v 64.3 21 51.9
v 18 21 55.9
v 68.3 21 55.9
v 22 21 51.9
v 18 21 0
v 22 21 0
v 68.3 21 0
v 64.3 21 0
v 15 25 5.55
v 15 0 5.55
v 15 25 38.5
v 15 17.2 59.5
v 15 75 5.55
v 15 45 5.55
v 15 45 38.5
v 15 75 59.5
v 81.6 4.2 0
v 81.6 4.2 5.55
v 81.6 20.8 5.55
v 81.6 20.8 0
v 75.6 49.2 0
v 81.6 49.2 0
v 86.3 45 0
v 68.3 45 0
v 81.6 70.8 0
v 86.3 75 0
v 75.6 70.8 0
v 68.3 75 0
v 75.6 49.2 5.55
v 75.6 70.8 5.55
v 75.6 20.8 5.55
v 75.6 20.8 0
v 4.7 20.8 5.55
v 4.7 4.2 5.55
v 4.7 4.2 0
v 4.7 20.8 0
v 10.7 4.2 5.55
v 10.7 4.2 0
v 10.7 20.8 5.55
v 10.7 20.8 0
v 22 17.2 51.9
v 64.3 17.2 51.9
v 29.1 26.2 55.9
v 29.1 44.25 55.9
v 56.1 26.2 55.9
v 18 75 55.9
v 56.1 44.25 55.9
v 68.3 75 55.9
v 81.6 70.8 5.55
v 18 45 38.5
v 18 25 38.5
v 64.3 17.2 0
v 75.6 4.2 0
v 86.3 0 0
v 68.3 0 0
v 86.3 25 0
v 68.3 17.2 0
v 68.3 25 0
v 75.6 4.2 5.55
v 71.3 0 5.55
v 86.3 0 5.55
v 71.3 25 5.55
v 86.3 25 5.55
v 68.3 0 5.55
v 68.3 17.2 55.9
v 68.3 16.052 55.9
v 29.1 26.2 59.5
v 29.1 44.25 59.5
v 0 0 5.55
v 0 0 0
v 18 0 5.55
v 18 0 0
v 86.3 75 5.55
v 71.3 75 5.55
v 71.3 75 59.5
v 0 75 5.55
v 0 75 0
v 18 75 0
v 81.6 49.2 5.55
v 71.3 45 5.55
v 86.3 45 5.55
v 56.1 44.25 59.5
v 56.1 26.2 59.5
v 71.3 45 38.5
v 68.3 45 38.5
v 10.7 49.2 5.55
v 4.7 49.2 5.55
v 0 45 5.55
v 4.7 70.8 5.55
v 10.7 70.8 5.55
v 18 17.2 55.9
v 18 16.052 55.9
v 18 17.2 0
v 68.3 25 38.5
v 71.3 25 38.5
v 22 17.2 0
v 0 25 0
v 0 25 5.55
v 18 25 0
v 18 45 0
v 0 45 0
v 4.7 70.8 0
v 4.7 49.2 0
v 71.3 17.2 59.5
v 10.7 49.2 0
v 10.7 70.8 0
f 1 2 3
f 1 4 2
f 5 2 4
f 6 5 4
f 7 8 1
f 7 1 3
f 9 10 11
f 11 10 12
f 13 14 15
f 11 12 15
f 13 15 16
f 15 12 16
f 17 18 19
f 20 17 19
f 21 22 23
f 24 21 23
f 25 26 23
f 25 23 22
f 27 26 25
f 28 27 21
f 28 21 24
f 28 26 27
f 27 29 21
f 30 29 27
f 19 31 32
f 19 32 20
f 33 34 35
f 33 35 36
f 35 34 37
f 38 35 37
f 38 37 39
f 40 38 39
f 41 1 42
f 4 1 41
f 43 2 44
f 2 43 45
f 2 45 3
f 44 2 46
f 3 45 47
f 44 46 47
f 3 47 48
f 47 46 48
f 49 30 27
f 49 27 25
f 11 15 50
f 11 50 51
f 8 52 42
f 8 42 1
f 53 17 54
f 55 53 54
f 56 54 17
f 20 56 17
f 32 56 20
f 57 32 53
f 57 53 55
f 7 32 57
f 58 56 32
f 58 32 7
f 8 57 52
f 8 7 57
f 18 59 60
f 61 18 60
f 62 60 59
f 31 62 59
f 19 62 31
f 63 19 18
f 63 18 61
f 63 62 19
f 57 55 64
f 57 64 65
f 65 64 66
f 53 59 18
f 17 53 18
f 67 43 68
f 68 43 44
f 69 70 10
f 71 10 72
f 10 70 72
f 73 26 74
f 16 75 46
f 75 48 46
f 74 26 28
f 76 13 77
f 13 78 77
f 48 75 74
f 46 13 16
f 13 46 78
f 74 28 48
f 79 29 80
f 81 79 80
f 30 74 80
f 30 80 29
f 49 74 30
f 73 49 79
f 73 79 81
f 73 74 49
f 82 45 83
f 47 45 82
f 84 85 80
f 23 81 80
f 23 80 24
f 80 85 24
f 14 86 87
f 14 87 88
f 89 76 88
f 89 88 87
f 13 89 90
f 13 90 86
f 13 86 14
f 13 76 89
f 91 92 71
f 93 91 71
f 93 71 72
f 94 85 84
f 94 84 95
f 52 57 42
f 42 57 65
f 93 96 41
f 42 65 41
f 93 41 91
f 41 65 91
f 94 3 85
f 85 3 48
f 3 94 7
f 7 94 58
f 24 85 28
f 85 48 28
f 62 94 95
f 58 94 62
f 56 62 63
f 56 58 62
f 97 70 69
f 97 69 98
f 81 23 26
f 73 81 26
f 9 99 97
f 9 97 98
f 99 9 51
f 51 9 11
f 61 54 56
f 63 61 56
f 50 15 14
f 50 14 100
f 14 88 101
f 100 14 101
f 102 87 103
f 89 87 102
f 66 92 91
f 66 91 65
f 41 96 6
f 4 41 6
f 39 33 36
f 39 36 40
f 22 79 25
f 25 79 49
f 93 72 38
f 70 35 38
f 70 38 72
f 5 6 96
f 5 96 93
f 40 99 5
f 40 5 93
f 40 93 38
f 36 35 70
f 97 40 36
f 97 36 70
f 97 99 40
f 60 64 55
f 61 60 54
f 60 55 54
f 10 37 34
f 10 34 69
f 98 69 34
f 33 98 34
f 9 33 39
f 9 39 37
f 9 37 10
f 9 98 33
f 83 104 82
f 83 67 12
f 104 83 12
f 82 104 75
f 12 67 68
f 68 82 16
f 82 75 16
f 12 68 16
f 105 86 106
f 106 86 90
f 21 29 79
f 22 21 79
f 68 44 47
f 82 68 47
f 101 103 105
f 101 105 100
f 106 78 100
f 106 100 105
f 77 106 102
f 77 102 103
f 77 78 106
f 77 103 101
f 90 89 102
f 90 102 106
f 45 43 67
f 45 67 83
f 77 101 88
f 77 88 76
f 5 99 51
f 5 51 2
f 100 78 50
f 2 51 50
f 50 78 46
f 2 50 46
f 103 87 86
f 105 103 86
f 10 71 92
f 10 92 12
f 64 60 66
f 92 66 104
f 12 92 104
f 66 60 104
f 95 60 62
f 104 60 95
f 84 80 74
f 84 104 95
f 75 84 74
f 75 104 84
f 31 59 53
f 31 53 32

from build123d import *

# Parameters (mm, degrees)
SKETCH1_W               = 27
SKETCH1_H               = 18.05
SKETCH1_W_2             = 15
SKETCH1_H_2             = 30
SKETCH1_H_3             = 25
BOSS_EXTRUDE1_DEPTH     = 59.5
SKETCH3_W               = 15
SKETCH3_H               = 75
CUT_EXTRUDE2_DEPTH      = 53.95
SKETCH4_W               = 6
SKETCH4_H               = 16.6
SKETCH4_H_2             = 21.6
CUT_EXTRUDE3_DEPTH      = 10
CUT_EXTRUDE4_DEPTH      = 1
CUT_EXTRUDE4_DEPTH_BACK = 54
CUT_EXTRUDE5_DEPTH      = 1
CUT_EXTRUDE5_DEPTH_BACK = 17.2
SKETCH8_W               = 42.3
SKETCH8_H               = 3.8
CUT_EXTRUDE6_DEPTH      = 51.9
CUT_EXTRUDE7_DEPTH      = 16
CUT_EXTRUDE7_DEPTH_BACK = 60
CUT_EXTRUDE8_DEPTH      = 60


with BuildPart() as part:
    # Sketch1 → Boss-Extrude1 (new body)
    with BuildSketch(Plane.XY):
        Polygon((71.3, 0), (15, 0), (15, 25), (15, 75), (71.3, 75), align=None)
        with Locations((42.6, 35.225)):
            Rectangle(SKETCH1_W, SKETCH1_H, mode=Mode.SUBTRACT)
        with Locations((78.8, 60)):
            Rectangle(SKETCH1_W_2, SKETCH1_H_2)
        with Locations((78.8, 12.5)):
            Rectangle(SKETCH1_W_2, SKETCH1_H_3)
        with Locations((7.5, 12.5)):
            Rectangle(SKETCH1_W_2, SKETCH1_H_3)
        with Locations((7.5, 60)):
            Rectangle(SKETCH1_W_2, SKETCH1_H_2)
    extrude(amount=BOSS_EXTRUDE1_DEPTH)

    # Sketch3 → Cut-Extrude2 (cut)
    with BuildSketch(Plane.XY.offset(59.5)):
        with Locations((7.5, 37.5)):
            Rectangle(SKETCH3_W, SKETCH3_H)
        with Locations((78.8, 37.5)):
            Rectangle(SKETCH3_W, SKETCH3_H)
    extrude(amount=-CUT_EXTRUDE2_DEPTH, mode=Mode.SUBTRACT)

    # Sketch4 → Cut-Extrude3 (cut)
    with BuildSketch(Plane.XY.offset(5.55)):
        with Locations((7.7, 12.5)):
            Rectangle(SKETCH4_W, SKETCH4_H)
        with Locations((7.7, 60)):
            Rectangle(SKETCH4_W, SKETCH4_H_2)
        with Locations((78.6, 60)):
            Rectangle(SKETCH4_W, SKETCH4_H_2)
        with Locations((78.6, 12.5)):
            Rectangle(SKETCH4_W, SKETCH4_H)
    extrude(amount=-CUT_EXTRUDE3_DEPTH, mode=Mode.SUBTRACT)

    # Sketch6 → Cut-Extrude4 (cut, two sides)
    with BuildSketch(Plane(origin=(0, 75, 0), x_dir=(1, 0, 0), z_dir=(0, 1, 0))) as cut_extrude4_sk:
        Polygon((18, 191.164455675), (18, 0), (18, -55.9), (68.3, -55.9), (68.3, 0), (68.3, 191.164455675), (68.3, 573.493367025), (18, 573.493367025), align=None)
    extrude(amount=CUT_EXTRUDE4_DEPTH, mode=Mode.SUBTRACT)
    extrude(cut_extrude4_sk.sketch, amount=-CUT_EXTRUDE4_DEPTH_BACK, mode=Mode.SUBTRACT)

    # Sketch7 → Cut-Extrude5 (cut, two sides)
    with BuildSketch(Plane.XZ) as cut_extrude5_sk:
        Polygon((18, -191.164455675), (18, 0), (18, 55.9), (68.3, 55.9), (68.3, 0), (68.3, -191.164455675), (68.3, -573.493367025), (18, -573.493367025), align=None)
    extrude(amount=CUT_EXTRUDE5_DEPTH, mode=Mode.SUBTRACT)
    extrude(cut_extrude5_sk.sketch, amount=-CUT_EXTRUDE5_DEPTH_BACK, mode=Mode.SUBTRACT)

    # Sketch8 → Cut-Extrude6 (cut)
    with BuildSketch(Plane(origin=(0, 0, 0), x_dir=(-1, 0, 0), z_dir=(0, 0, -1))):
        with Locations((-43.15, 19.1)):
            Rectangle(SKETCH8_W, SKETCH8_H)
    extrude(amount=-CUT_EXTRUDE6_DEPTH, mode=Mode.SUBTRACT)

    # Sketch9 → Cut-Extrude7 (cut, two sides)
    with BuildSketch(Plane.ZY.offset(-15)) as cut_extrude7_sk:
        Polygon((-165.43809057, 45), (0, 45), (38.5, 45), (38.5, 25), (0, 25), (-165.43809057, 25), (-496.31427171, 25), (-496.31427171, 45), align=None)
    extrude(amount=CUT_EXTRUDE7_DEPTH, mode=Mode.SUBTRACT)
    extrude(cut_extrude7_sk.sketch, amount=-CUT_EXTRUDE7_DEPTH_BACK, mode=Mode.SUBTRACT)

    # Sketch11 → Cut-Extrude8 (cut)
    with BuildSketch(Plane(origin=(71.3, 0, 0), x_dir=(0, 0, -1), z_dir=(1, 0, 0))):
        Polygon((-5.55, 0), (-59.5, 17.2), (-59.5, 0), align=None)
    extrude(amount=-CUT_EXTRUDE8_DEPTH, mode=Mode.SUBTRACT)


solid = part.part
